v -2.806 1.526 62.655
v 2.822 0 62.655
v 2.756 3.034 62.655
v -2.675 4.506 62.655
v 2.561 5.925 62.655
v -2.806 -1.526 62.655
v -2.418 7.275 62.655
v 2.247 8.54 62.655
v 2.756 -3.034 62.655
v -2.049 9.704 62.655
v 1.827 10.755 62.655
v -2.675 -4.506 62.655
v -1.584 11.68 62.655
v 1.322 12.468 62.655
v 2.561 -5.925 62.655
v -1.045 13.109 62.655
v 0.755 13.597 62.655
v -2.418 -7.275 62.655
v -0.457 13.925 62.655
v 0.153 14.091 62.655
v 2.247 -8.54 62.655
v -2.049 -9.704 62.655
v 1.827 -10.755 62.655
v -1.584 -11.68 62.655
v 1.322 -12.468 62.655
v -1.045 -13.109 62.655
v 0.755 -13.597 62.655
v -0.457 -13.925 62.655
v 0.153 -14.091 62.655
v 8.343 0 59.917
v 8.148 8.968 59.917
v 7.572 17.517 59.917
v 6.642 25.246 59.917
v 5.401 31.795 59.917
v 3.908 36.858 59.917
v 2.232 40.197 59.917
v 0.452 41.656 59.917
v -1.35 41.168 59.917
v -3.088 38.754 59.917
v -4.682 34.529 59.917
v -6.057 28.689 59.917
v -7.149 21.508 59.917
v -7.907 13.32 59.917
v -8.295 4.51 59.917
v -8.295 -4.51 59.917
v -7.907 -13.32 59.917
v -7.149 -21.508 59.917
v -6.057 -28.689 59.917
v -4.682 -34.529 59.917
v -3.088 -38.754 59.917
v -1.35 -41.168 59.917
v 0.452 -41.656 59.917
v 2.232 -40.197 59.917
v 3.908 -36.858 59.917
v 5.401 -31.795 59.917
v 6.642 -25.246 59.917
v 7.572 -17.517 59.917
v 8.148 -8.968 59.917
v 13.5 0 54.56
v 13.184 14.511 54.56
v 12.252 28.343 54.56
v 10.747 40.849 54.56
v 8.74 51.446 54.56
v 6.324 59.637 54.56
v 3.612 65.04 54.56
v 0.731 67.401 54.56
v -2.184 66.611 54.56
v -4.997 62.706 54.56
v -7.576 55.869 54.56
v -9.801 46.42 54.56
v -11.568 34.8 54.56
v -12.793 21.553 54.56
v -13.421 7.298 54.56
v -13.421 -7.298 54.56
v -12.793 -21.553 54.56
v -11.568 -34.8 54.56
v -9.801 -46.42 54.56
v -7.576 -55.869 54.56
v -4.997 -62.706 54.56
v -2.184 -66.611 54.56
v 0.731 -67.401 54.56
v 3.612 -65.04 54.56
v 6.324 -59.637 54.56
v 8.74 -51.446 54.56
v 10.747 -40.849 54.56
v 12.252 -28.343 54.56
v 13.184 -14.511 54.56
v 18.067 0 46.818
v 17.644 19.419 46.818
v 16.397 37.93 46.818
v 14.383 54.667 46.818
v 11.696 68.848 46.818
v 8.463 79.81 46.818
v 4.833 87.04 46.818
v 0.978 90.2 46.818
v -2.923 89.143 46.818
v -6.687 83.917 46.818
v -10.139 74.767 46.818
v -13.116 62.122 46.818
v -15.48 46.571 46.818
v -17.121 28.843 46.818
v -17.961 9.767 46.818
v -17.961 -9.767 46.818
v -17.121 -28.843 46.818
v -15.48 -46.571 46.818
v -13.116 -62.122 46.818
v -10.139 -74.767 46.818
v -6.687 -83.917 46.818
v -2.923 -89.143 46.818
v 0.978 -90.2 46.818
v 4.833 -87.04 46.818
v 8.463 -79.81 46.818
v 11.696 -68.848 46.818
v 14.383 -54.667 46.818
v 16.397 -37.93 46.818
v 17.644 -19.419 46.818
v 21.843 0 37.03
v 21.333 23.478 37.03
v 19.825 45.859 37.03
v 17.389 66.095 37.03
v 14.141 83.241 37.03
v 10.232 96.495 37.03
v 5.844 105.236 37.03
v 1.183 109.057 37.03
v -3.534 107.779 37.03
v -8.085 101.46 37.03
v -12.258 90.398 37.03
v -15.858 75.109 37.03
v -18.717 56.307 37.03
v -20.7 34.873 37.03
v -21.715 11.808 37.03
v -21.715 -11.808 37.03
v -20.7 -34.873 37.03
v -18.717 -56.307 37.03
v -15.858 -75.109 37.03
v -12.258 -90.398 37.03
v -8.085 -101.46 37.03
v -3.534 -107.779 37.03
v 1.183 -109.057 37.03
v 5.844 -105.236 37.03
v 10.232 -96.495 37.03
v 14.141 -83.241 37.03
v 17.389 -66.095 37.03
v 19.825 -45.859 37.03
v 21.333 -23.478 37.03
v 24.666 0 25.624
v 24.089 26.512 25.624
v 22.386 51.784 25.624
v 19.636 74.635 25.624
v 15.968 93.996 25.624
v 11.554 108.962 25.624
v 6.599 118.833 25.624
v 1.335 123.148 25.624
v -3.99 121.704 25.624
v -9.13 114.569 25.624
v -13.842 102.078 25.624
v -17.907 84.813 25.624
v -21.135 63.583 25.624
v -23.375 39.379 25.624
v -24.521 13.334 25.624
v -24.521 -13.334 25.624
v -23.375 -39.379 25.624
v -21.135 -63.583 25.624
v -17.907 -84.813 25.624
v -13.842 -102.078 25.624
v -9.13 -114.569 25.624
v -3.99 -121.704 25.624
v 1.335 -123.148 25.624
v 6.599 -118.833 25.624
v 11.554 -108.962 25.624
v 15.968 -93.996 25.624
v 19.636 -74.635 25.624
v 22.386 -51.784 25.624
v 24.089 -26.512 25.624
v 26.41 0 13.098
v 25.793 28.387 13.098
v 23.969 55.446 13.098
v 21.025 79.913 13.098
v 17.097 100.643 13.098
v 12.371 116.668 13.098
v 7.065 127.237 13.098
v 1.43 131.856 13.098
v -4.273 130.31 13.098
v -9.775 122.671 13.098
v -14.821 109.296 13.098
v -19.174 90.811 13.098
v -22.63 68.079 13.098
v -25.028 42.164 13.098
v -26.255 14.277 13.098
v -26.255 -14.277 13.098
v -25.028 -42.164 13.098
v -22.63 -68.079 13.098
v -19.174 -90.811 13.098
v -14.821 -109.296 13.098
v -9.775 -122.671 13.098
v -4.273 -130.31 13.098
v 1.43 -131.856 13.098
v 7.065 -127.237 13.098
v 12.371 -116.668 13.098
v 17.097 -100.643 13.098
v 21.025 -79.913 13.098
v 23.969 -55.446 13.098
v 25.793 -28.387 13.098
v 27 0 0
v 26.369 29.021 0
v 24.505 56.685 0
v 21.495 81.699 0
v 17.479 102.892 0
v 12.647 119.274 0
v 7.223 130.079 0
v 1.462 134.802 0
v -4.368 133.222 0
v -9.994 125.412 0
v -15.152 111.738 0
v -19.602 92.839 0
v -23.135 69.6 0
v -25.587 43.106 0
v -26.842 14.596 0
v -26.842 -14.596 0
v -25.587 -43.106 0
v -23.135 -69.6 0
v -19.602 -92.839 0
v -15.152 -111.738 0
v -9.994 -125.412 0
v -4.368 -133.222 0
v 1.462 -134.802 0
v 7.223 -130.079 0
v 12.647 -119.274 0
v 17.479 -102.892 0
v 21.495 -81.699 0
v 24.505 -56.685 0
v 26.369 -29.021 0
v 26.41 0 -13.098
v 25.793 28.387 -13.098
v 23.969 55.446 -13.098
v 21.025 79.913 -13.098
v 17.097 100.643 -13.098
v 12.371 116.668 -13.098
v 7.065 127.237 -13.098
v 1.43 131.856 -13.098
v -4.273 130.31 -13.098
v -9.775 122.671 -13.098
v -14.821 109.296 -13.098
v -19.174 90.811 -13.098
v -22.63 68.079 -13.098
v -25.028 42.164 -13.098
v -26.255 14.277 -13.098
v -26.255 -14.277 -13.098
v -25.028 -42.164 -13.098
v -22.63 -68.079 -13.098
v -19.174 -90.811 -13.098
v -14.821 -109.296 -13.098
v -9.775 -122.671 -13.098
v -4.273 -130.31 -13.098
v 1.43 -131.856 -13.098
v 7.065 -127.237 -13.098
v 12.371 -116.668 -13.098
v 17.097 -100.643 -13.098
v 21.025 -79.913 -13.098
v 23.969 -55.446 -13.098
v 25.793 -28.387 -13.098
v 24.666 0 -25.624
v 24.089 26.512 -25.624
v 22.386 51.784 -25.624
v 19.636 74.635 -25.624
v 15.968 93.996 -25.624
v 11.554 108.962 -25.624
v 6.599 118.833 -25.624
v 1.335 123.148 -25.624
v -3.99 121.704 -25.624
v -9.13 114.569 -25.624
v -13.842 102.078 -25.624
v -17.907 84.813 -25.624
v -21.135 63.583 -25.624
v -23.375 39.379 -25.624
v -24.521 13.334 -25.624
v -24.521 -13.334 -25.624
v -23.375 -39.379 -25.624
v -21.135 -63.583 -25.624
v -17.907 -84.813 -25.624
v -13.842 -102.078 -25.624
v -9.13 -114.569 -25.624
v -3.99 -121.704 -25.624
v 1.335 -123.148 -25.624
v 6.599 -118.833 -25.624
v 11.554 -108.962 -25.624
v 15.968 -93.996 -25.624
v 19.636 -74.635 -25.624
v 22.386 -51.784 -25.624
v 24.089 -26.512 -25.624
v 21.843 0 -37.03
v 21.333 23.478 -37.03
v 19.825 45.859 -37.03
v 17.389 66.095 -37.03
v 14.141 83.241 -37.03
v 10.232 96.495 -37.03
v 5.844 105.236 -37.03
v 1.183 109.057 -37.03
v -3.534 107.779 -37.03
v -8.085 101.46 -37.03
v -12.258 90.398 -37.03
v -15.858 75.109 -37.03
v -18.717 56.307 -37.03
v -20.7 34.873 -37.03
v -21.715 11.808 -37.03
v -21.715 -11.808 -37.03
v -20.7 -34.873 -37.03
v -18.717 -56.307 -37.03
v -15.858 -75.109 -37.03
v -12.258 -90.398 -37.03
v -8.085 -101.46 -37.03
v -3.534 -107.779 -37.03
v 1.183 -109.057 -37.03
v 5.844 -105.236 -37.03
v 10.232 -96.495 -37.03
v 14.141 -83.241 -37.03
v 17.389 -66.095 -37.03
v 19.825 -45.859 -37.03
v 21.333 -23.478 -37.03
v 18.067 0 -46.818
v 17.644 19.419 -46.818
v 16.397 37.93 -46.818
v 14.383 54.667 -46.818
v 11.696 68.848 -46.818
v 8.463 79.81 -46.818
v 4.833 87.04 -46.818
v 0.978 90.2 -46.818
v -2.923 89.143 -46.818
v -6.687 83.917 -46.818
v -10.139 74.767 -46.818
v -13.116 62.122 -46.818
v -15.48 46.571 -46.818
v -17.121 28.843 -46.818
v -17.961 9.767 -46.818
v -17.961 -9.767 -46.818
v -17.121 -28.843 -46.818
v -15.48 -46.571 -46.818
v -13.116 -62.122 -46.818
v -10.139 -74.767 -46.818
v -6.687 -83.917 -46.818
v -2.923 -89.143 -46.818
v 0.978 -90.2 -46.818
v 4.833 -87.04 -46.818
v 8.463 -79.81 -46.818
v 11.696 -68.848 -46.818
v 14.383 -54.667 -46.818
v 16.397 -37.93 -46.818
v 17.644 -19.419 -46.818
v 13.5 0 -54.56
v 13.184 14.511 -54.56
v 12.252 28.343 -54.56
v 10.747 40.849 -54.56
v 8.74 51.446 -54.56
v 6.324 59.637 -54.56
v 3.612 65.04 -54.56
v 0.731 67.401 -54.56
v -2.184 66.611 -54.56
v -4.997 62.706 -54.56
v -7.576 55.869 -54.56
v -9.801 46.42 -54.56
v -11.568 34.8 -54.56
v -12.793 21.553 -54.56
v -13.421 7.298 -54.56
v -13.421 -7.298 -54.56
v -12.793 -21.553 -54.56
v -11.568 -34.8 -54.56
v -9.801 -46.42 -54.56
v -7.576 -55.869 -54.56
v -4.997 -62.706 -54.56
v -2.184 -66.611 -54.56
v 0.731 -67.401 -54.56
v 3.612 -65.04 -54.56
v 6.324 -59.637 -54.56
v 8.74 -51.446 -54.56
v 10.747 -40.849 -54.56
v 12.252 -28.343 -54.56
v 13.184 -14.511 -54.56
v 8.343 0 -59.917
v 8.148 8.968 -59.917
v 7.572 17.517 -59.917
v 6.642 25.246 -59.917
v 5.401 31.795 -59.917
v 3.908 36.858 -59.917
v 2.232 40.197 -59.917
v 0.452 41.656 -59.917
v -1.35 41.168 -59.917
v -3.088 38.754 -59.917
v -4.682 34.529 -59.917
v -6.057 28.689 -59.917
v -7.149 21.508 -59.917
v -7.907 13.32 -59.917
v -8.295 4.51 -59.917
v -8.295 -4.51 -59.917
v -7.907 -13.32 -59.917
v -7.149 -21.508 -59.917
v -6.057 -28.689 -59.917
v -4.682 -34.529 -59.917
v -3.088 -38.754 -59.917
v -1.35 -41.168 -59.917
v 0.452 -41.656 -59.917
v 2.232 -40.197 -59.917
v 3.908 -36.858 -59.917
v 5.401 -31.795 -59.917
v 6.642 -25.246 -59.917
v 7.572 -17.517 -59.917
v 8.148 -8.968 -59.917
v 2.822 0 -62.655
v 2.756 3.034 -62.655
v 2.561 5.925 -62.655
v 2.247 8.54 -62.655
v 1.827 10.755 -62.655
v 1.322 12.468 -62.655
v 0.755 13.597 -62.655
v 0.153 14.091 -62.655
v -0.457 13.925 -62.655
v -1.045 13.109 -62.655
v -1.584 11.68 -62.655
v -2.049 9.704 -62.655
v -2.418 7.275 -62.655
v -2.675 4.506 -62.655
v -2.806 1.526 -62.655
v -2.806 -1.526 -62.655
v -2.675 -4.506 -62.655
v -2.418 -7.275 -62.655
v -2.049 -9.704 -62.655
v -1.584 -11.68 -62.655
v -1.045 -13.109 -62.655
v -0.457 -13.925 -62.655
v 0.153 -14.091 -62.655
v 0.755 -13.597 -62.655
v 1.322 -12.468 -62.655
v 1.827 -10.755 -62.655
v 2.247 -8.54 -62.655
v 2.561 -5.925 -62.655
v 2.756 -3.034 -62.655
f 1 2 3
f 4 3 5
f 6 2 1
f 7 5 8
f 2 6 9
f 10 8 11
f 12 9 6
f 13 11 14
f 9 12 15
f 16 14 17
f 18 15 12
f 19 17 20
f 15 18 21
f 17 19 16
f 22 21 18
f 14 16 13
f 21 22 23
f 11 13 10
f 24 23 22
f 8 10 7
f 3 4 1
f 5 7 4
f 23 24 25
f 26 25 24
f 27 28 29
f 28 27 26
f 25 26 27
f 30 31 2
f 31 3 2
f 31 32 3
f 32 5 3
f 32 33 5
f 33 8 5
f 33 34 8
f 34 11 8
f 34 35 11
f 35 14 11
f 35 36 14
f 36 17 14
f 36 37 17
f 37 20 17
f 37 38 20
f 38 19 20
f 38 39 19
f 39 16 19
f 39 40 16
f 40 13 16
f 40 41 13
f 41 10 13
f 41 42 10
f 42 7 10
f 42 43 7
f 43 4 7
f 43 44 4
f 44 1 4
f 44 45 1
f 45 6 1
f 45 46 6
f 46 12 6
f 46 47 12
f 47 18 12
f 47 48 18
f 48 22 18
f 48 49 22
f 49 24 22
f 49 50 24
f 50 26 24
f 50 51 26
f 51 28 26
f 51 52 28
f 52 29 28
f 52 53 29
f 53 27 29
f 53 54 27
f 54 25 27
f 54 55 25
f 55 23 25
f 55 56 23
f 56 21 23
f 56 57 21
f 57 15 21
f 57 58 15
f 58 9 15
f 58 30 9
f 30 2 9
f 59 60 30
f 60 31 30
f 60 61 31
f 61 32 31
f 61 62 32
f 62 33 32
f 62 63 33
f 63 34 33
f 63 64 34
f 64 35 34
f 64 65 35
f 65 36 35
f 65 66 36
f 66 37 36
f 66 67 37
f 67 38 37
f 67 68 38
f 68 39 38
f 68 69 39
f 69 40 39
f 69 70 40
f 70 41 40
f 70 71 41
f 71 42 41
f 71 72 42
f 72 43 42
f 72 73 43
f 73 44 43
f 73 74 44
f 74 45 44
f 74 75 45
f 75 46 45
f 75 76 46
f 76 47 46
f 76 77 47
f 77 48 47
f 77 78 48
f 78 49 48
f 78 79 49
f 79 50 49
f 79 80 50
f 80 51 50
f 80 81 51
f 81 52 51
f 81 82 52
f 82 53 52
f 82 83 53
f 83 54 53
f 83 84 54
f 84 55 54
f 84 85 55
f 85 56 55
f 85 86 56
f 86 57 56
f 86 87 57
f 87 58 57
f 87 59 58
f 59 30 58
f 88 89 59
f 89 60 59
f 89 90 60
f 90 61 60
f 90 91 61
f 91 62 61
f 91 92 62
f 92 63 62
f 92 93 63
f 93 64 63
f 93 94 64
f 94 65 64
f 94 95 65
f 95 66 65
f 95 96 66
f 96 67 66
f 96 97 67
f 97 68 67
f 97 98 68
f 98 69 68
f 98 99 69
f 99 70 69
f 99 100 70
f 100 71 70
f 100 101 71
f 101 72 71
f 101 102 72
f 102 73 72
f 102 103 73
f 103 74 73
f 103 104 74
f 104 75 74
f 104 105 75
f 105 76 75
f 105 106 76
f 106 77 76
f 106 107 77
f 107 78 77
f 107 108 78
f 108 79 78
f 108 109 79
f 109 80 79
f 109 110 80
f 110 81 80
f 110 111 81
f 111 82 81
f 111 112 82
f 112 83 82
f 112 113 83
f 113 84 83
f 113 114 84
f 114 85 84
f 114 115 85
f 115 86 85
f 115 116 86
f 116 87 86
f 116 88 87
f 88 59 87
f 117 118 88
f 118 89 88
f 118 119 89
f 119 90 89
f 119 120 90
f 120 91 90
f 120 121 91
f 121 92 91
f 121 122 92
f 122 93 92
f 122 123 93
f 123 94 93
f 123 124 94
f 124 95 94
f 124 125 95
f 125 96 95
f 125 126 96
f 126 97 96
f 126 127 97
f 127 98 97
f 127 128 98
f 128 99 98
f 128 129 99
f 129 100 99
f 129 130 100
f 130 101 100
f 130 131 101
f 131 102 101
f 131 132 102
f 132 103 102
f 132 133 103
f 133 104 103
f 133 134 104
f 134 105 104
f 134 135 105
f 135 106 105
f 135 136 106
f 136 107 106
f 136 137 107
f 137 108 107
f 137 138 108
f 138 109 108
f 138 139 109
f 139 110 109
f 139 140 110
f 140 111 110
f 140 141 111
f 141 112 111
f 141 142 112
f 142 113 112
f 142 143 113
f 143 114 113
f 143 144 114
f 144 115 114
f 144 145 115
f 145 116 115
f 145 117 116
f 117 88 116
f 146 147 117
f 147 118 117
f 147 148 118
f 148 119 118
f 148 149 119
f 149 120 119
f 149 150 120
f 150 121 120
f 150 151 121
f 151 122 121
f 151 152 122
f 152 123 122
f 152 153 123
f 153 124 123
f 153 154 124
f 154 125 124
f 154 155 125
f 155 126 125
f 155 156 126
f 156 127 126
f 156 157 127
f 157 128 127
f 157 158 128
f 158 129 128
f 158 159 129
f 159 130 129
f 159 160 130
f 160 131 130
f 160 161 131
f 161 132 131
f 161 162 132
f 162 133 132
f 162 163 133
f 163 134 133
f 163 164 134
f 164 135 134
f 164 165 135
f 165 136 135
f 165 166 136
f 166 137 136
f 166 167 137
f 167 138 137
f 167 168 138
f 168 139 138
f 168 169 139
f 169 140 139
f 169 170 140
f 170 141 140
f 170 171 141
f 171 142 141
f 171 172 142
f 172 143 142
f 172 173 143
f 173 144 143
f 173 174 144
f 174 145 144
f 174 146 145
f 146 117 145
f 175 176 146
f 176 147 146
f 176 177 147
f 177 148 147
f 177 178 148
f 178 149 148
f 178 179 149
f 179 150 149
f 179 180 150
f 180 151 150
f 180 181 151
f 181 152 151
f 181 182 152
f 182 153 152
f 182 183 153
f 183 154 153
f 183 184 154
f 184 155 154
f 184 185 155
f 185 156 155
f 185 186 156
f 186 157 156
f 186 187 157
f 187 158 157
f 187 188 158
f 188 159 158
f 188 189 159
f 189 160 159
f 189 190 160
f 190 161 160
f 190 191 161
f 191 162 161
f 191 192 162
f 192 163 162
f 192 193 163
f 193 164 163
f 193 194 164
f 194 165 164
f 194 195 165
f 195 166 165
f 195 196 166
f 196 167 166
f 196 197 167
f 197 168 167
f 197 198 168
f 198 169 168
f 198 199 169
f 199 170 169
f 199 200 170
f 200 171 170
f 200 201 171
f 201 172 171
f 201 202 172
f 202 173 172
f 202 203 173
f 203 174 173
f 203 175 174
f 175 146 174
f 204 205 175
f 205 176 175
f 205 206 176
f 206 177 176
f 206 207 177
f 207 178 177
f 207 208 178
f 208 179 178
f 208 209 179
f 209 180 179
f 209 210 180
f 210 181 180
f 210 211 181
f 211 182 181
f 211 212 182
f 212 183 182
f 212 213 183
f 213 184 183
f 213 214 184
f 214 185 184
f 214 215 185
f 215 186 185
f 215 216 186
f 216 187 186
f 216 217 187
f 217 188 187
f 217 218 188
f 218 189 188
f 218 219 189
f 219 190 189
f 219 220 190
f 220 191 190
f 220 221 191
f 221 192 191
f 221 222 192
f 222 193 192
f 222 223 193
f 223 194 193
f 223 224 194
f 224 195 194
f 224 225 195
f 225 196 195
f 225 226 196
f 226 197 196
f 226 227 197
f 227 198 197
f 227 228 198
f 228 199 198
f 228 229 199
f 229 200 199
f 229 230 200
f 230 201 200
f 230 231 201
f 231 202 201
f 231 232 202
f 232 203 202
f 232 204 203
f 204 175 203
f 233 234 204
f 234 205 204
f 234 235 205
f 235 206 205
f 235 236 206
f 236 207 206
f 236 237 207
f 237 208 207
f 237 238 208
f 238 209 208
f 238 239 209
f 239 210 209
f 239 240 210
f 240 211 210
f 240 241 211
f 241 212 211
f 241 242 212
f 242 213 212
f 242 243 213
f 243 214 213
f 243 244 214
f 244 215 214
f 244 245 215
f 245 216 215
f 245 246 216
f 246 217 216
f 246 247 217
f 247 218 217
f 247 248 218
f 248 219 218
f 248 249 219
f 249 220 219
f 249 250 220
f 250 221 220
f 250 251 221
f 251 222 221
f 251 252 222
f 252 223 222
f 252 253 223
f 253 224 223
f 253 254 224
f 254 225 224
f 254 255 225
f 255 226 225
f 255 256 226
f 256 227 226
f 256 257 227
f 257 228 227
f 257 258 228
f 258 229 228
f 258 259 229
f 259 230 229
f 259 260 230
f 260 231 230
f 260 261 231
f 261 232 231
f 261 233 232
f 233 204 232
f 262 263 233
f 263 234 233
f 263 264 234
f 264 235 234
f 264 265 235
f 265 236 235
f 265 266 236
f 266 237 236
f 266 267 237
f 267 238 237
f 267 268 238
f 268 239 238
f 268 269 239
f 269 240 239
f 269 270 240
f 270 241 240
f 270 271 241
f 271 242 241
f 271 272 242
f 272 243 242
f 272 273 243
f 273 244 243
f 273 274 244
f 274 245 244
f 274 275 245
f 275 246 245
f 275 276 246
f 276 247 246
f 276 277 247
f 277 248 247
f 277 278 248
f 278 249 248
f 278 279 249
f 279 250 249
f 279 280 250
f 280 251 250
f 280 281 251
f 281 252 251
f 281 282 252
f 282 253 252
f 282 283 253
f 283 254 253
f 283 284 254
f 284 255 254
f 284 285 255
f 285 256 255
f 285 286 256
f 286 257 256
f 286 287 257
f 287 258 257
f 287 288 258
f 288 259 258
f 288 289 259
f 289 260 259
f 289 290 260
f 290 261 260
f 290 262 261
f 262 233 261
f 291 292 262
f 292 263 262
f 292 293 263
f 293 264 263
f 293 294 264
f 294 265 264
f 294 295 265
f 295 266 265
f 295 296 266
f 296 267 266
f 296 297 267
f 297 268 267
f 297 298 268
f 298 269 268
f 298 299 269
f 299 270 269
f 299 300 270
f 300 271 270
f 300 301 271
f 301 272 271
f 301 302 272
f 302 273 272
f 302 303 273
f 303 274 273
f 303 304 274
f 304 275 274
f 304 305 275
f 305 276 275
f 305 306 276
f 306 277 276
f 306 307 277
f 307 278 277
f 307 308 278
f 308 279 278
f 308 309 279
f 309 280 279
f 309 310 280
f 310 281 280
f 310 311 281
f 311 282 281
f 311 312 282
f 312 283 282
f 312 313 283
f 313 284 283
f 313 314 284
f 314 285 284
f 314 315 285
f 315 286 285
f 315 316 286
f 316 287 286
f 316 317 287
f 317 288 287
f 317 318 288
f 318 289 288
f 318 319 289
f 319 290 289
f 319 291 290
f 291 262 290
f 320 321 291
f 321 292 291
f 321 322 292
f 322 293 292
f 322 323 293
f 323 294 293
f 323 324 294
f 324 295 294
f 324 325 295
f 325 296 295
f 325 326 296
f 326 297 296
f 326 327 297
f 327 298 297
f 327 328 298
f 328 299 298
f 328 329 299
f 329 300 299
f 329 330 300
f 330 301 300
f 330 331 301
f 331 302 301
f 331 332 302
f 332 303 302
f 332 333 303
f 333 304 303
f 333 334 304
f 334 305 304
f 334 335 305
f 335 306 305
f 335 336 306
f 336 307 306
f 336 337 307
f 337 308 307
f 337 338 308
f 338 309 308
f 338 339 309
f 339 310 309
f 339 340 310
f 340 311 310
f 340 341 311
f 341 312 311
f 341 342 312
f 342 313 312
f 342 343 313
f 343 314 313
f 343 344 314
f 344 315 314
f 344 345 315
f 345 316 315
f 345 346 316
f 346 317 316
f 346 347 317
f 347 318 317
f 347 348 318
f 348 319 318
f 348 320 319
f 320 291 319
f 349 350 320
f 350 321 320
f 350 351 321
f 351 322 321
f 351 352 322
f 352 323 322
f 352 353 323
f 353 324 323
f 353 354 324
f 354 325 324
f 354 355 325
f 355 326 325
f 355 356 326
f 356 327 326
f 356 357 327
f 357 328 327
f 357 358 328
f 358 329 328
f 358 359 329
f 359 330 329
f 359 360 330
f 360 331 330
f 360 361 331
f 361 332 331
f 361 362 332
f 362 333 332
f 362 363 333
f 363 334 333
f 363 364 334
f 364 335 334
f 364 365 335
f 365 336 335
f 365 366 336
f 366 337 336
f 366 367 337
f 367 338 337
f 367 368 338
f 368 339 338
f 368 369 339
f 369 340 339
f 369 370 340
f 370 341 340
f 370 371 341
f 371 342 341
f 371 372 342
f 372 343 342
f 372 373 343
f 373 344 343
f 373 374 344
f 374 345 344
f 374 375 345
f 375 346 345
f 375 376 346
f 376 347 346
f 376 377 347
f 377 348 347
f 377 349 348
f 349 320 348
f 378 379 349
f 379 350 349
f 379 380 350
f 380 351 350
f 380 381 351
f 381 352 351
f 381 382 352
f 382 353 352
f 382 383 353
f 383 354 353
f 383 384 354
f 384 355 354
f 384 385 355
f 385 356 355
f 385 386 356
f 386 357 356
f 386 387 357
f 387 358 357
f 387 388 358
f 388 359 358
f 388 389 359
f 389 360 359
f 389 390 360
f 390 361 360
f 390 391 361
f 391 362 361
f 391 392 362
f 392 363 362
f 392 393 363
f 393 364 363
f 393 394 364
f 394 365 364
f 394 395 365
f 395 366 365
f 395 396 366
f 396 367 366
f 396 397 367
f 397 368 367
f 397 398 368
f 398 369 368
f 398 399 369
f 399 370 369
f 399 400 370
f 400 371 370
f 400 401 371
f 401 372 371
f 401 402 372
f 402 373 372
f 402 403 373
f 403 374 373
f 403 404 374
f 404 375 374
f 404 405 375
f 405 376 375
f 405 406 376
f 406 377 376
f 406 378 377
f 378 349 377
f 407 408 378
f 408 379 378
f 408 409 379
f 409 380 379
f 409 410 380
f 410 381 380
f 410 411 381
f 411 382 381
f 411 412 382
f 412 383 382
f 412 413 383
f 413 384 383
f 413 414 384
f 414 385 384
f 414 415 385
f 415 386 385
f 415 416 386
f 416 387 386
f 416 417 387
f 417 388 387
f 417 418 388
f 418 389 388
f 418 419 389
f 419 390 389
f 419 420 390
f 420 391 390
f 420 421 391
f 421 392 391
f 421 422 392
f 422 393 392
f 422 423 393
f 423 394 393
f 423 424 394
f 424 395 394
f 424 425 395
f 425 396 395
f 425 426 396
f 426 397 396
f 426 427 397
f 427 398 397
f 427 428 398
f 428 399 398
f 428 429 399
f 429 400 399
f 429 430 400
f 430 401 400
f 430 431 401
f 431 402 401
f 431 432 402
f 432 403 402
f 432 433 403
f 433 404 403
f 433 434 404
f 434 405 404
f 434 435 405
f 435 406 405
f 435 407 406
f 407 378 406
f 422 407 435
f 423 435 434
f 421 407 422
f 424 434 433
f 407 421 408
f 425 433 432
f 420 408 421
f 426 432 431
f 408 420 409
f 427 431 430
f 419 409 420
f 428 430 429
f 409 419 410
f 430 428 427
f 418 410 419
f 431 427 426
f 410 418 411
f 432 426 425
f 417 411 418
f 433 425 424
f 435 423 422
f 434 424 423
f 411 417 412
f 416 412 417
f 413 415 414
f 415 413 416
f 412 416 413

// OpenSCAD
// Generated by SolidPython 1.0.1 on 2020-07-29 00:46:45


scale(v = [3, 15, 7]) {
	sphere(r = 9);
}
/***********************************************
*********      SolidPython code:      **********
************************************************
 
# import packages: SolidPython
from solid import *
from solid.utils import *
from itertools import chain, combinations, permutations


class Resize:

    def __init__(self, scad_file):
        self.scad_file = scad_file
        #self.scad_file = import_scad(scad_file)
        # cone/cylinder param:
        self.r1 = 0
        self.r2 = 0
        self.h = 0
        # rectangular prism param:
        self.w = 0
        self.l = 0
        # ellipse param:
        self.r = 0

    # import OpenScad code (file name corresponds to shape)


    # classify shape + parameters
    def assign(self, param1, param2, param3):
        if self.scad_file == 'cone.scad':
            self.r1 = param1
            self.r2 = param2
            self.h = param3
        elif self.scad_file == 'cylinder.scad':
            self.r1 = param1
            self.r2 = param2
            self.h = param3
        elif self.scad_file == 'rectangularPrism.scad':
            self.h = param1
            self.l = param2
            self.w = param3
        else:
            self.r = param1
            self.h = param2

    # resize parameters
    def iterate(self):
        x = range(3, 20, 2)
        i = 1
        if self.scad_file == 'cone.scad':
            tempList = list(permutations(x, 2))
            for temp in tempList:
                param1 = temp[0]
                param2 = temp[1]
                filepath = 'produced_scad_files/' + 'cone' + str(param1) + '_' + str(param2) + '_' + '.scad'
                scad_render_to_file(cylinder(h=param1, r1=param2, r2=0), filepath)

        elif self.scad_file == 'cylinder.scad':
            tempList = list(permutations(x, 3))
            for temp in tempList:
                param1 = temp[0]
                param2 = temp[1]
                filepath = 'produced_scad_files/' + 'cylinder' + str(param1) + '_' + str(param2) + '_' + '.scad'
                scad_render_to_file(cylinder(h=param1, r1=param2, r2=param2), filepath)

        elif self.scad_file == 'rectangularPrism.scad':
            tempList = list(permutations(x, 3))
            for temp in tempList:
                param1 = temp[0]
                param2 = temp[1]
                param3 = temp[2]
                filepath = 'produced_scad_files/' + 'rectangularPrism' + str(param1) + '_' + str(param2) + '_' + str(
                    param3) + '.scad'
                scad_render_to_file(cube(size=(param1, param2, param3)), filepath)

        elif self.scad_file == 'ellipse.scad':
            tempList = list(permutations(x, 4))
            for temp in tempList:
                param1 = temp[0]
                param2 = temp[1]
                param3 = temp[2]
                param4 = temp[3]
                filepath = 'produced_scad_files/' + 'ellipse' + str(param1) + '_' + str(param2) + '_' + str(param3) + '_' + str(param4) + '.scad'
                scad_render_to_file(scale([param1, param2, param3])(sphere(r=param4)), filepath)

    def render_to_scadfile(self):
        scad_render_to_file(scad, 'example.scad') 
 
************************************************/
